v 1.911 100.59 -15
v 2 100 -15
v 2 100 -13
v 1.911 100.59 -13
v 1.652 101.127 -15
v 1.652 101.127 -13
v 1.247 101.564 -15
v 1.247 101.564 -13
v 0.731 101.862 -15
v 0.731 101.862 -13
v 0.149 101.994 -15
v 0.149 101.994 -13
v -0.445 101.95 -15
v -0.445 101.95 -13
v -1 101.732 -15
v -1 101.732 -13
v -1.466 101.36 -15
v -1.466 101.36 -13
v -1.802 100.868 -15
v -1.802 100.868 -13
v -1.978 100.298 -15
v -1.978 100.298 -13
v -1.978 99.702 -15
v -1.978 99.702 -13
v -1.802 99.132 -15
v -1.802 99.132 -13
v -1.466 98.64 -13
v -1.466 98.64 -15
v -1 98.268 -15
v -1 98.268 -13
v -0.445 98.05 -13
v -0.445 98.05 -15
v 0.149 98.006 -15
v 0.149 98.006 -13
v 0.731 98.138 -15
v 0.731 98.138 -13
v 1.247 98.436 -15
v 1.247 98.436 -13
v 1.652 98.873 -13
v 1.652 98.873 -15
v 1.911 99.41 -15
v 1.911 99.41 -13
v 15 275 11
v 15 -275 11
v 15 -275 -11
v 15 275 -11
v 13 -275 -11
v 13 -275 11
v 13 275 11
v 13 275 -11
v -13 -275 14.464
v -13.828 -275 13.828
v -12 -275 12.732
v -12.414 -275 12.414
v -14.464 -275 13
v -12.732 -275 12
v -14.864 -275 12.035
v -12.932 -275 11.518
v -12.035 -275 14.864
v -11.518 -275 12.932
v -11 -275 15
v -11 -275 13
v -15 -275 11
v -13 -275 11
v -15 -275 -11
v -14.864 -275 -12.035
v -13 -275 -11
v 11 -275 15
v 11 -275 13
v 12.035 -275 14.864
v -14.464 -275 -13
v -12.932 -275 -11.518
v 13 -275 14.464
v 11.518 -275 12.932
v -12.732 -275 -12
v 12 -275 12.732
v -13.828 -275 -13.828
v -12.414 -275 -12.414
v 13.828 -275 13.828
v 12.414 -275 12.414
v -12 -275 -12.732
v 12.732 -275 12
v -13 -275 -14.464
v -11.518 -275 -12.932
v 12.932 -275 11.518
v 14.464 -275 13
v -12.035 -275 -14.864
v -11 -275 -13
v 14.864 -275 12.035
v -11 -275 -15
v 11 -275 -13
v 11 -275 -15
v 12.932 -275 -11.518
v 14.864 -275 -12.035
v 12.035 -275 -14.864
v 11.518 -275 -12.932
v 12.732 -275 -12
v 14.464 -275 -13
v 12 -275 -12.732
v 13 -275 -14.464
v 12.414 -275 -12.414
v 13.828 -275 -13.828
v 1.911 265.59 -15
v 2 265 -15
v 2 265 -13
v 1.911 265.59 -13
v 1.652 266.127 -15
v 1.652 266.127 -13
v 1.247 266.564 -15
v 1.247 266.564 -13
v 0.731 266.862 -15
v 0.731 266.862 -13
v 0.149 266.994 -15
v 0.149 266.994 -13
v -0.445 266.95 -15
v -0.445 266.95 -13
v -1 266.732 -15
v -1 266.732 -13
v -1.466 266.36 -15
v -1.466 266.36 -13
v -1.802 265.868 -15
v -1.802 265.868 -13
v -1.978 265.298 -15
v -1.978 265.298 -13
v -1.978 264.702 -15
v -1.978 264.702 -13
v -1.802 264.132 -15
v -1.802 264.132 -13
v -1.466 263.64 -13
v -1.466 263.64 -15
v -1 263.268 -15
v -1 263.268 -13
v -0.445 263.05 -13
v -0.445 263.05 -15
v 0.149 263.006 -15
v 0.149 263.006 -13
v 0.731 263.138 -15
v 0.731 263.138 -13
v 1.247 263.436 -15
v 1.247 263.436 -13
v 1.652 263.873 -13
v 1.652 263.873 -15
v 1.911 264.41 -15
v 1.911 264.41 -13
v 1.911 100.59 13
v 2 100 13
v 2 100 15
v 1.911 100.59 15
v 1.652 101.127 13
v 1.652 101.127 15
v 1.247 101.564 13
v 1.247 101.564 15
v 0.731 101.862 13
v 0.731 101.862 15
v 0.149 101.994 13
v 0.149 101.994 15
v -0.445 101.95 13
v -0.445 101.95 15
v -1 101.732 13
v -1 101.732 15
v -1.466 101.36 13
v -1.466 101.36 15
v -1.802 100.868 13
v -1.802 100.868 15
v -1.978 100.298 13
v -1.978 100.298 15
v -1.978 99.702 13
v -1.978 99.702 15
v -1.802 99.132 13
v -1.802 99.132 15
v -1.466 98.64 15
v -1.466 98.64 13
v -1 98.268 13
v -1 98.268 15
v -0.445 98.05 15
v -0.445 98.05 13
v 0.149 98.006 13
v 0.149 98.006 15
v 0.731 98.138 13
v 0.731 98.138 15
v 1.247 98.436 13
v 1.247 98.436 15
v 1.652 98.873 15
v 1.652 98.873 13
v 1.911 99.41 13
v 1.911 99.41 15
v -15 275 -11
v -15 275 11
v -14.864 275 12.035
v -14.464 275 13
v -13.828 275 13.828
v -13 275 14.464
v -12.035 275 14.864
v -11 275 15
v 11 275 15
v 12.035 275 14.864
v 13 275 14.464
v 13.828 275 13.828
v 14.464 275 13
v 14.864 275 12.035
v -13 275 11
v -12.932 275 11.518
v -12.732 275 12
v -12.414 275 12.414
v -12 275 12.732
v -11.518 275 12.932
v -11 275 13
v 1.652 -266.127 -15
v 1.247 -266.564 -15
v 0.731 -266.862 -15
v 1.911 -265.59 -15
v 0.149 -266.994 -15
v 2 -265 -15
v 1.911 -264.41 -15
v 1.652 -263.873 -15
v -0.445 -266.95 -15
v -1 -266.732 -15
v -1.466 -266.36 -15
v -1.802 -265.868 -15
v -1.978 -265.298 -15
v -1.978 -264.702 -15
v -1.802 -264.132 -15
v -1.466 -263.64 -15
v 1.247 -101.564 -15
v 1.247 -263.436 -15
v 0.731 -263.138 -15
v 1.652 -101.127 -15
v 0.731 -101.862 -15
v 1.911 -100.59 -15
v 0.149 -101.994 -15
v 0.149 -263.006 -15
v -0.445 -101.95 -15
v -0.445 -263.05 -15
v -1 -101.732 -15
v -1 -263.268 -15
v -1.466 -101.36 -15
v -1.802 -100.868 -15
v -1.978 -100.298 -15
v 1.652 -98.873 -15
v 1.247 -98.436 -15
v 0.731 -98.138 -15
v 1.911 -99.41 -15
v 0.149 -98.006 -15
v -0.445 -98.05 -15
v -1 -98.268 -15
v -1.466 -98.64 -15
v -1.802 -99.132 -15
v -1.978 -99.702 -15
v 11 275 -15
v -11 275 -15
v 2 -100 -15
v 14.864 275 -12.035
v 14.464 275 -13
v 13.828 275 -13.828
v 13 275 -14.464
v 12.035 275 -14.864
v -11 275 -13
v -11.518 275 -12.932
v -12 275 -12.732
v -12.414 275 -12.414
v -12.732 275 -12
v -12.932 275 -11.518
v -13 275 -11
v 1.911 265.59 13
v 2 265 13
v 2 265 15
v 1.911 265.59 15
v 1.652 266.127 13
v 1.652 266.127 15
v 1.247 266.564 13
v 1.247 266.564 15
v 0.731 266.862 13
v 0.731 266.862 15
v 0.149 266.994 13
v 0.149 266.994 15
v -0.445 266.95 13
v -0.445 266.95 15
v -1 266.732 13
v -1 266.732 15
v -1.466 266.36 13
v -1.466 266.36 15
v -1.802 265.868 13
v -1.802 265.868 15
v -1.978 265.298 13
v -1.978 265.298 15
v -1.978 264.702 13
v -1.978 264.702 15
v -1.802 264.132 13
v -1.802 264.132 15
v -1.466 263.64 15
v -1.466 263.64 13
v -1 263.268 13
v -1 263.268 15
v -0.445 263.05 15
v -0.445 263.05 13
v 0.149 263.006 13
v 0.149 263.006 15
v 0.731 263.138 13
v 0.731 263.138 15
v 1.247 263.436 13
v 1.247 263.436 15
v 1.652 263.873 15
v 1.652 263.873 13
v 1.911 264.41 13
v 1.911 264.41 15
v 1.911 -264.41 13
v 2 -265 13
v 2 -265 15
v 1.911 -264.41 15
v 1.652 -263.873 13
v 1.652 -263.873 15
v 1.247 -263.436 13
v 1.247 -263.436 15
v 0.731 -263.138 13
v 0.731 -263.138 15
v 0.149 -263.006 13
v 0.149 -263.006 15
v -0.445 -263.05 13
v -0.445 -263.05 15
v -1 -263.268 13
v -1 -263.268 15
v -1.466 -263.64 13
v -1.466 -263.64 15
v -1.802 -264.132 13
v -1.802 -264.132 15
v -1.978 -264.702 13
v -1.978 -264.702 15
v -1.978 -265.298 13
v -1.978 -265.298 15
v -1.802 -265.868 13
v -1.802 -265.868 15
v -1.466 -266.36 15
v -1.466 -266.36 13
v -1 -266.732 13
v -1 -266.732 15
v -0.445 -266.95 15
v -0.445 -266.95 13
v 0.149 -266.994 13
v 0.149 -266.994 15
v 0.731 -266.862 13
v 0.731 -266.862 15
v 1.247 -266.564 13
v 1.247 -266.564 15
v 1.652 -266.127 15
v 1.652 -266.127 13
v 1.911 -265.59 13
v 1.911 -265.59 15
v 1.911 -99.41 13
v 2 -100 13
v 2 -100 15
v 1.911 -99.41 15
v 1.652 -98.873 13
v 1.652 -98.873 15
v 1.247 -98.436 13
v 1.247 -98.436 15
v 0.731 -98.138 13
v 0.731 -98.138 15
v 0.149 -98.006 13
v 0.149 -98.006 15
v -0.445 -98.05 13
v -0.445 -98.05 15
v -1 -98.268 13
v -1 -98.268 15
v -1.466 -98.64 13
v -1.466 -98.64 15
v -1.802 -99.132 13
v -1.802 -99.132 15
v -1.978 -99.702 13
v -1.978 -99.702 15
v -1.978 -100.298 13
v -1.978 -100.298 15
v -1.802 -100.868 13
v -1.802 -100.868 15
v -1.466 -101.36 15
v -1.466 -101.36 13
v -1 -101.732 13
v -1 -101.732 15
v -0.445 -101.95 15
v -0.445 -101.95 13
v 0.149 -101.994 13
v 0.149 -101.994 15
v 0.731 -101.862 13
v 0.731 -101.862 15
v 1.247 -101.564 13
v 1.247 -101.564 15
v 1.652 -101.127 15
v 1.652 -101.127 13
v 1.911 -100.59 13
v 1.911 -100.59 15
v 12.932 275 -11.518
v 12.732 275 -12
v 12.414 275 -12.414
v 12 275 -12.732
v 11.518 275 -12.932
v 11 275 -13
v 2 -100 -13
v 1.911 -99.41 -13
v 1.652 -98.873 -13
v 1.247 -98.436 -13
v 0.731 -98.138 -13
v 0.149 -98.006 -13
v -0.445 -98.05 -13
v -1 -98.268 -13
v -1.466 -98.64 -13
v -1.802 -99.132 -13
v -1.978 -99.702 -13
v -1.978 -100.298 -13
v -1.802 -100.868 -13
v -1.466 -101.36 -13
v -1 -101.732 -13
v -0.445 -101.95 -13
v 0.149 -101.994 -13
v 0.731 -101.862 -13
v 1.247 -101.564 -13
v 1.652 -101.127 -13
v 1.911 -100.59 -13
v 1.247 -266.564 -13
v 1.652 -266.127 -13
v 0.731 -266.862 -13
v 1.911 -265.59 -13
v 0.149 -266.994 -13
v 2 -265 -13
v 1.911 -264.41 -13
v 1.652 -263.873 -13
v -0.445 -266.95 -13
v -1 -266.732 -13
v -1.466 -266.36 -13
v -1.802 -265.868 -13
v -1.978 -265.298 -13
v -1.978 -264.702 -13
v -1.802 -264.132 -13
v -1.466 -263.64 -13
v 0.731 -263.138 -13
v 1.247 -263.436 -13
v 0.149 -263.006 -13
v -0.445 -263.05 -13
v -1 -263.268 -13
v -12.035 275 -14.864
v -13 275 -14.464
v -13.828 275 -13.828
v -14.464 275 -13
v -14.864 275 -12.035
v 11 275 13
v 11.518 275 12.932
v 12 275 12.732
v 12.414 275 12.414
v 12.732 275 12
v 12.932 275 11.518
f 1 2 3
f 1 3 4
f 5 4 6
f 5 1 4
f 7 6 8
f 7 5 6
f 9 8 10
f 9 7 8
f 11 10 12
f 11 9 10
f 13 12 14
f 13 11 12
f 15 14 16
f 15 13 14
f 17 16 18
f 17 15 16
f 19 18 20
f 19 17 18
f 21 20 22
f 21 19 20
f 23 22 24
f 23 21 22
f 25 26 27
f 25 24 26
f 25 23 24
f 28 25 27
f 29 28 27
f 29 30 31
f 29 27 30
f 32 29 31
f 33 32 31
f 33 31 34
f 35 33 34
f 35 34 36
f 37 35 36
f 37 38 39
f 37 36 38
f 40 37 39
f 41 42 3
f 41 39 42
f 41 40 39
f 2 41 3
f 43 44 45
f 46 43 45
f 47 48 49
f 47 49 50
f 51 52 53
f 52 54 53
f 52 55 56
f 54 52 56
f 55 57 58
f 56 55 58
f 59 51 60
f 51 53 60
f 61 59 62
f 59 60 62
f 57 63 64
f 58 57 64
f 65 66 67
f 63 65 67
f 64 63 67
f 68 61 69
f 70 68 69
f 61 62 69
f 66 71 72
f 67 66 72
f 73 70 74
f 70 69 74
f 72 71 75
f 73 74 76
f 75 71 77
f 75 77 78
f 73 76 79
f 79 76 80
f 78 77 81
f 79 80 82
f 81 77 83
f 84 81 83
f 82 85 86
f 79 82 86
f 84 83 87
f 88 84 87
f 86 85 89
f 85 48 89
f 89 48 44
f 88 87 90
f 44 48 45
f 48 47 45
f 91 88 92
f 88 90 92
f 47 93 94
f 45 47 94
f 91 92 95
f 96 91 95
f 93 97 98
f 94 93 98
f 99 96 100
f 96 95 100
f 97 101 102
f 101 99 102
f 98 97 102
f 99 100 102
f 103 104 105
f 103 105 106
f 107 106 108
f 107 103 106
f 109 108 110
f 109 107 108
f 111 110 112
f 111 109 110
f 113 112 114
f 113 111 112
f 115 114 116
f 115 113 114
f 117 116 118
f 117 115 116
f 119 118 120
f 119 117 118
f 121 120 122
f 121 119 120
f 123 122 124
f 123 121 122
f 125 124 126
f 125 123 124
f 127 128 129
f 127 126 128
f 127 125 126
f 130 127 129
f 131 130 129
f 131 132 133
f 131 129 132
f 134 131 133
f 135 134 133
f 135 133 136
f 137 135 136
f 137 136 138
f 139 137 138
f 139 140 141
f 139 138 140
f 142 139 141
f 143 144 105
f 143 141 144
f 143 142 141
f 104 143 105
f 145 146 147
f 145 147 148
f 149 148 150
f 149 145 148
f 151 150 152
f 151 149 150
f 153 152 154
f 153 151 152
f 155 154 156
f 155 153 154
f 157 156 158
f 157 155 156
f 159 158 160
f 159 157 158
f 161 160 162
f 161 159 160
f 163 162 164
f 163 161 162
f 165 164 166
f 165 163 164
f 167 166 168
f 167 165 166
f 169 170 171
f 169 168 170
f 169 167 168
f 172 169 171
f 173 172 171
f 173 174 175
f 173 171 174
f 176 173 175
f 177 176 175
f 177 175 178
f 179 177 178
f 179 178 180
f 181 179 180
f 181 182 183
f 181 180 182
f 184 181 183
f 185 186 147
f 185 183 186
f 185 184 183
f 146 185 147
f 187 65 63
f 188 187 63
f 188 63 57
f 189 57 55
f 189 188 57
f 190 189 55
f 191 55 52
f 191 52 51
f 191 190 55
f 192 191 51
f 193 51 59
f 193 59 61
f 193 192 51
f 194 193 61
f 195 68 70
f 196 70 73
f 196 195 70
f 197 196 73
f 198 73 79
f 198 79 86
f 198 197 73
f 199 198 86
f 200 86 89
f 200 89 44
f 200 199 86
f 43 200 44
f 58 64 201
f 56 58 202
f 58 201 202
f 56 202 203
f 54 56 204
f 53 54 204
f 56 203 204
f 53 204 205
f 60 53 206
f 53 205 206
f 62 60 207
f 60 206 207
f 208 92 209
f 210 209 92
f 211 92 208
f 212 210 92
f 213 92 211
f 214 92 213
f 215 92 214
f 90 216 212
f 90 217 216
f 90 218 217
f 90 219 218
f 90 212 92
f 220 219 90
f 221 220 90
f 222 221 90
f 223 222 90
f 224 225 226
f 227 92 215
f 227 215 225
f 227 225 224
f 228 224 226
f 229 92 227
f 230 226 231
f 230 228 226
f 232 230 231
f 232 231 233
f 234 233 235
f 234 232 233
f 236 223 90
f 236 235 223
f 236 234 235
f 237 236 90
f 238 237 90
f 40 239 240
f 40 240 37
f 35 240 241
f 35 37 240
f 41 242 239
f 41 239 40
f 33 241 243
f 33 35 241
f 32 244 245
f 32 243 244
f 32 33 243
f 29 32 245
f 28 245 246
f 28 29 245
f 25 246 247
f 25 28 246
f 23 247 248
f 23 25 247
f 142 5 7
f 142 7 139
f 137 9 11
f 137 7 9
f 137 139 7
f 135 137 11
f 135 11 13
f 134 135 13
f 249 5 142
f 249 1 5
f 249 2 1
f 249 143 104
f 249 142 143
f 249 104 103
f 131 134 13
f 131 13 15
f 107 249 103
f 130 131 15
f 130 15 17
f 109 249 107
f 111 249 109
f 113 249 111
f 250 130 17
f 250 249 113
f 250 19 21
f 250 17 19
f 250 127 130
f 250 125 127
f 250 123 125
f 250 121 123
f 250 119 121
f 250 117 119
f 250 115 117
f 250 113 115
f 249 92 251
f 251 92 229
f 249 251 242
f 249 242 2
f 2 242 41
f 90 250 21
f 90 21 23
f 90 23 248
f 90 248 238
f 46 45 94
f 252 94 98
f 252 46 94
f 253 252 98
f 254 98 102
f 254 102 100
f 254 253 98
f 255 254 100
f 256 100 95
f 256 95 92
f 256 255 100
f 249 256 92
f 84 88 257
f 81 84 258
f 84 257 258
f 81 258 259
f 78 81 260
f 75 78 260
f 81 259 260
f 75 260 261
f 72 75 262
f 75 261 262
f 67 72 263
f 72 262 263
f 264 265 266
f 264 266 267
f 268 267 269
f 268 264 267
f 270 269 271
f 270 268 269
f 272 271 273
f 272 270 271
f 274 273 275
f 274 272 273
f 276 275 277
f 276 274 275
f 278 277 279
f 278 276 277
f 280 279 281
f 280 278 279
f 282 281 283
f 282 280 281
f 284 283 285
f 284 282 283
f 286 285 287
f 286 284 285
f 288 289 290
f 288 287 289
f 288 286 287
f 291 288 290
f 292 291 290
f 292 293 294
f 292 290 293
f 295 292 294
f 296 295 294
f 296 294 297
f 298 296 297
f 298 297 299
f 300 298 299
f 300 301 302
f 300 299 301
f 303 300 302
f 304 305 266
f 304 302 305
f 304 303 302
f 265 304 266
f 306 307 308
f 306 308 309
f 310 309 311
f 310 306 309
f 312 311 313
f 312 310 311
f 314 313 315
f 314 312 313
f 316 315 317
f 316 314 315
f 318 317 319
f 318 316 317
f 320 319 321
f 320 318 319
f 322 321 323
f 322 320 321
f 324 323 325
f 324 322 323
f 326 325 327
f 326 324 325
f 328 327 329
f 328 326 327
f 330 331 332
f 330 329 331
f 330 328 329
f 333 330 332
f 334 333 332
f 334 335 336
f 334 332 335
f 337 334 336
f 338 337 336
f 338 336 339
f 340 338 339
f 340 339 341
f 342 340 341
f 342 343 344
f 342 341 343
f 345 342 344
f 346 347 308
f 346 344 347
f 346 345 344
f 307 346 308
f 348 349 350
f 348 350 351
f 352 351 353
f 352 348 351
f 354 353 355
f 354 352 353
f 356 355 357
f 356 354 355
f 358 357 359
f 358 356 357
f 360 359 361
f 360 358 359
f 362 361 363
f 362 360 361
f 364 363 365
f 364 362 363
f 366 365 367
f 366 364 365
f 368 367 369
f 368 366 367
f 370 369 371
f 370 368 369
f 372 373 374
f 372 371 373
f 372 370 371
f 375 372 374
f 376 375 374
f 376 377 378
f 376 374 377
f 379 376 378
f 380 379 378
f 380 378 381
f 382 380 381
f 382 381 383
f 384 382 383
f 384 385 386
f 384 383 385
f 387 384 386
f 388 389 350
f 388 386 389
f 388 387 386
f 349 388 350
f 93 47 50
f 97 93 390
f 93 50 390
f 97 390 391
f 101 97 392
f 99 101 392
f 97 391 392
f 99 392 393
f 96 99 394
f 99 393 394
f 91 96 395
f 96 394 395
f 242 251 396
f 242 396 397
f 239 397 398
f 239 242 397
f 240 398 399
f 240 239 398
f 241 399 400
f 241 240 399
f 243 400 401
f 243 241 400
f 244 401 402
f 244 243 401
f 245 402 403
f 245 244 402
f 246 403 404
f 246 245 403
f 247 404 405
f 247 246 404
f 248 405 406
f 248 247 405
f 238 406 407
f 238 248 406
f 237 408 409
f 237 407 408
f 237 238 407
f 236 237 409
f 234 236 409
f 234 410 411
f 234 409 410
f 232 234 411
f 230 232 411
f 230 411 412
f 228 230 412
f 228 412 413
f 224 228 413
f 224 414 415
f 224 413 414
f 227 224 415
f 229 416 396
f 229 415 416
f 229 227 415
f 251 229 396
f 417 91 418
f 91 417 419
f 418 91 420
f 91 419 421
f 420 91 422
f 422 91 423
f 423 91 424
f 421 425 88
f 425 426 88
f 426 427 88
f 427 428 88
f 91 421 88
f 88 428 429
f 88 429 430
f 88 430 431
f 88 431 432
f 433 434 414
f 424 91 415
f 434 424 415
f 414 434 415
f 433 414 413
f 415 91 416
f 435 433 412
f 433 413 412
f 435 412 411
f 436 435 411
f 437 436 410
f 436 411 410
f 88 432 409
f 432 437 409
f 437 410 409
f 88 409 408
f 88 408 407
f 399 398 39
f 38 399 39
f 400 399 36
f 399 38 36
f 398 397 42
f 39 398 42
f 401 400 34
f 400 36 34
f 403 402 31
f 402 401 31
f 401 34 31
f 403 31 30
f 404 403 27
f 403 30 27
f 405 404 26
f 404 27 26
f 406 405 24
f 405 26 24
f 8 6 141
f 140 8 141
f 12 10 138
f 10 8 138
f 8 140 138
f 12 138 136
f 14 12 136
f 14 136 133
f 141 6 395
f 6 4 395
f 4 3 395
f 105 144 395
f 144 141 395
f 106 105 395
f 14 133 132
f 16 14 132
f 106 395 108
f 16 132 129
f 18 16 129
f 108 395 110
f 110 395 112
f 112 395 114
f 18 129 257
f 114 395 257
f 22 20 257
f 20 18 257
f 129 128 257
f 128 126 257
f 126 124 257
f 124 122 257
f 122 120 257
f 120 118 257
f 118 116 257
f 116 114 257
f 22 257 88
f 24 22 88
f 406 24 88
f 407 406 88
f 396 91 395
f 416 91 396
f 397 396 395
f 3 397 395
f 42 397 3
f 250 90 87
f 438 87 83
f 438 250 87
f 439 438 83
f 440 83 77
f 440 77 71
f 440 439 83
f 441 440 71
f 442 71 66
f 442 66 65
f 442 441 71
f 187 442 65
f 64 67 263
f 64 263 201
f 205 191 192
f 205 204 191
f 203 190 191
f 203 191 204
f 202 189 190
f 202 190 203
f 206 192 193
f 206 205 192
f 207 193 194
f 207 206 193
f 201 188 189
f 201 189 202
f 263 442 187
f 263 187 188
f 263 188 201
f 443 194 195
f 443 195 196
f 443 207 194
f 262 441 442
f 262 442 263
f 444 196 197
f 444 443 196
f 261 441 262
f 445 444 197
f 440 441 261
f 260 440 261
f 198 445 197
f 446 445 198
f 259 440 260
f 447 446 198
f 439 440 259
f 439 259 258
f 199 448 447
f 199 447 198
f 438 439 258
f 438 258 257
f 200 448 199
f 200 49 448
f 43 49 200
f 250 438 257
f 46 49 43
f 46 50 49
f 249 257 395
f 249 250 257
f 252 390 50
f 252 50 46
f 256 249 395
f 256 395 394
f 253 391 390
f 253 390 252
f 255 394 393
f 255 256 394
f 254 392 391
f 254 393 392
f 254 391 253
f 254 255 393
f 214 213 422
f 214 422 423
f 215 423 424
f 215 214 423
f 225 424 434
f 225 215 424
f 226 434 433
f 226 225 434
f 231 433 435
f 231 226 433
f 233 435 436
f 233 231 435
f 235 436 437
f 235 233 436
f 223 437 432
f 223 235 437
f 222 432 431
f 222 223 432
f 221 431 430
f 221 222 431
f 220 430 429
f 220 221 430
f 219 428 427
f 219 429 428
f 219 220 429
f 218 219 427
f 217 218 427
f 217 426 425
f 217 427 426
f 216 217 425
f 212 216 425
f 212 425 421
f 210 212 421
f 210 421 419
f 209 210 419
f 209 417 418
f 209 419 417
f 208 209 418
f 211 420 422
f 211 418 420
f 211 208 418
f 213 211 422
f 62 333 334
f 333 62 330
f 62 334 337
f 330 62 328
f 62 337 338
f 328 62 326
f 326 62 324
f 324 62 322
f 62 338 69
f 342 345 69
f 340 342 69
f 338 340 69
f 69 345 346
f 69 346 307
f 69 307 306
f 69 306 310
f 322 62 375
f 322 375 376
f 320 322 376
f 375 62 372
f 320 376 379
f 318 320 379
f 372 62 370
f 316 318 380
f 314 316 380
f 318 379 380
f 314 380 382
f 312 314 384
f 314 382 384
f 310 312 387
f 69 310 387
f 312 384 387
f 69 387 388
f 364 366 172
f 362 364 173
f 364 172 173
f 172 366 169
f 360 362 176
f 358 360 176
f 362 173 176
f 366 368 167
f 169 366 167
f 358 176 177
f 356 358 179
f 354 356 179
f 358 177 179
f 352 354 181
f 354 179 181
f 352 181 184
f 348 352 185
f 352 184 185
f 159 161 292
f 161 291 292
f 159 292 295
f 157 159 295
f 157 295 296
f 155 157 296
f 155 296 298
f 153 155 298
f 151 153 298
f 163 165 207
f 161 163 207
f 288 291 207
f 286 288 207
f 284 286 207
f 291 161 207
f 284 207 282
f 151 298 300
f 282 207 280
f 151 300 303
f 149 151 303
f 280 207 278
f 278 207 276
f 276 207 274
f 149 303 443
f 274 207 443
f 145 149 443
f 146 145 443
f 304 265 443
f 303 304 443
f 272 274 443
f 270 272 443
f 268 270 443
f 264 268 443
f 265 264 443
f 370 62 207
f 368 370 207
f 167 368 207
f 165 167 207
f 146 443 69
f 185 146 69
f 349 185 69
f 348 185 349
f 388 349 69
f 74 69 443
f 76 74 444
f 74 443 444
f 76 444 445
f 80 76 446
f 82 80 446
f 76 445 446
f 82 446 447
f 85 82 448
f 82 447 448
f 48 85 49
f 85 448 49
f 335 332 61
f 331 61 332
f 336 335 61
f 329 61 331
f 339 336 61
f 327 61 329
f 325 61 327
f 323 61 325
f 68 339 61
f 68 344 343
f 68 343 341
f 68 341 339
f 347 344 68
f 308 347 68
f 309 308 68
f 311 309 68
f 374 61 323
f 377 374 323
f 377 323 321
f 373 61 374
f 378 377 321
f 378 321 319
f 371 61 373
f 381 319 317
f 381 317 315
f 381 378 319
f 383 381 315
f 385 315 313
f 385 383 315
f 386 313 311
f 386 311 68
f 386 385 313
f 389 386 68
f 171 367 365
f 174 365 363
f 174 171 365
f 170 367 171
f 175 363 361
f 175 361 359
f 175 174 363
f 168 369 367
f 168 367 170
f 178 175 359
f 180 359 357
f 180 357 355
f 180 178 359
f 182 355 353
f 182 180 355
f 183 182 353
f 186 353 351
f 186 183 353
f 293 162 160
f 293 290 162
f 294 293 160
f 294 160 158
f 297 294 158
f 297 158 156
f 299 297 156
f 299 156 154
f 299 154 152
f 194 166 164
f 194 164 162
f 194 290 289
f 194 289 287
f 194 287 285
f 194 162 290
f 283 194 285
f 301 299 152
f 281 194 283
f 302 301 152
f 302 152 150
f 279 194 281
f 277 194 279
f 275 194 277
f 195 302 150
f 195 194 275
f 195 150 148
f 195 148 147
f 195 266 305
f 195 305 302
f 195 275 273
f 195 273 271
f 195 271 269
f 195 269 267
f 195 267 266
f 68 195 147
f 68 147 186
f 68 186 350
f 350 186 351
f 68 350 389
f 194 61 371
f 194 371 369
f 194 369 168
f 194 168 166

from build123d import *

# Parameters (mm, degrees)
EXTRUDE_1_DEPTH          = 275
CUT_EXTRUDE_1_DEPTH      = 276.816968296
CUT_EXTRUDE_1_DEPTH_BACK = 276.816968296
SKETCH_2_R               = 2


with BuildPart() as part:
    # 草图1 → 凸台-拉伸1 (new, symmetric)
    with BuildSketch(Plane(origin=(0, 0, 0), x_dir=(1, 0, 0), z_dir=(0, 1, 0))):
        with BuildLine():
            Line((-11, -15), (11, -15))
            ThreePointArc((11, -15), (13.828427125, -13.828427125), (15, -11))
            Line((15, -11), (15, 11))
            ThreePointArc((15, 11), (13.828427125, 13.828427125), (11, 15))
            Line((11, 15), (-11, 15))
            ThreePointArc((-11, 15), (-13.828427125, 13.828427125), (-15, 11))
            Line((-15, 11), (-15, -11))
            ThreePointArc((-15, -11), (-13.828427125, -13.828427125), (-11, -15))
        make_face()
        with BuildLine():
            Line((-11, -13), (11, -13))
            ThreePointArc((11, -13), (12.414213562, -12.414213562), (13, -11))
            Line((13, -11), (13, 11))
            ThreePointArc((13, 11), (12.414213562, 12.414213562), (11, 13))
            Line((11, 13), (-11, 13))
            ThreePointArc((-11, 13), (-12.414213562, 12.414213562), (-13, 11))
            Line((-13, 11), (-13, -11))
            ThreePointArc((-13, -11), (-12.414213562, -12.414213562), (-11, -13))
        make_face(mode=Mode.SUBTRACT)
    extrude(amount=EXTRUDE_1_DEPTH, both=True)

    # 草图2 → 切除-拉伸1 (cut, two sides: drawn at the far end of the back side and taken through both)
    with BuildSketch(Plane.XY.offset(-CUT_EXTRUDE_1_DEPTH_BACK)):
        with Locations((0, 265)):
            Circle(SKETCH_2_R)
        with Locations((0, 100)):
            Circle(SKETCH_2_R)
        with Locations((0, -100)):
            Circle(SKETCH_2_R)
        with Locations((0, -265)):
            Circle(SKETCH_2_R)
    extrude(amount=CUT_EXTRUDE_1_DEPTH + CUT_EXTRUDE_1_DEPTH_BACK, mode=Mode.SUBTRACT)


solid = part.part
